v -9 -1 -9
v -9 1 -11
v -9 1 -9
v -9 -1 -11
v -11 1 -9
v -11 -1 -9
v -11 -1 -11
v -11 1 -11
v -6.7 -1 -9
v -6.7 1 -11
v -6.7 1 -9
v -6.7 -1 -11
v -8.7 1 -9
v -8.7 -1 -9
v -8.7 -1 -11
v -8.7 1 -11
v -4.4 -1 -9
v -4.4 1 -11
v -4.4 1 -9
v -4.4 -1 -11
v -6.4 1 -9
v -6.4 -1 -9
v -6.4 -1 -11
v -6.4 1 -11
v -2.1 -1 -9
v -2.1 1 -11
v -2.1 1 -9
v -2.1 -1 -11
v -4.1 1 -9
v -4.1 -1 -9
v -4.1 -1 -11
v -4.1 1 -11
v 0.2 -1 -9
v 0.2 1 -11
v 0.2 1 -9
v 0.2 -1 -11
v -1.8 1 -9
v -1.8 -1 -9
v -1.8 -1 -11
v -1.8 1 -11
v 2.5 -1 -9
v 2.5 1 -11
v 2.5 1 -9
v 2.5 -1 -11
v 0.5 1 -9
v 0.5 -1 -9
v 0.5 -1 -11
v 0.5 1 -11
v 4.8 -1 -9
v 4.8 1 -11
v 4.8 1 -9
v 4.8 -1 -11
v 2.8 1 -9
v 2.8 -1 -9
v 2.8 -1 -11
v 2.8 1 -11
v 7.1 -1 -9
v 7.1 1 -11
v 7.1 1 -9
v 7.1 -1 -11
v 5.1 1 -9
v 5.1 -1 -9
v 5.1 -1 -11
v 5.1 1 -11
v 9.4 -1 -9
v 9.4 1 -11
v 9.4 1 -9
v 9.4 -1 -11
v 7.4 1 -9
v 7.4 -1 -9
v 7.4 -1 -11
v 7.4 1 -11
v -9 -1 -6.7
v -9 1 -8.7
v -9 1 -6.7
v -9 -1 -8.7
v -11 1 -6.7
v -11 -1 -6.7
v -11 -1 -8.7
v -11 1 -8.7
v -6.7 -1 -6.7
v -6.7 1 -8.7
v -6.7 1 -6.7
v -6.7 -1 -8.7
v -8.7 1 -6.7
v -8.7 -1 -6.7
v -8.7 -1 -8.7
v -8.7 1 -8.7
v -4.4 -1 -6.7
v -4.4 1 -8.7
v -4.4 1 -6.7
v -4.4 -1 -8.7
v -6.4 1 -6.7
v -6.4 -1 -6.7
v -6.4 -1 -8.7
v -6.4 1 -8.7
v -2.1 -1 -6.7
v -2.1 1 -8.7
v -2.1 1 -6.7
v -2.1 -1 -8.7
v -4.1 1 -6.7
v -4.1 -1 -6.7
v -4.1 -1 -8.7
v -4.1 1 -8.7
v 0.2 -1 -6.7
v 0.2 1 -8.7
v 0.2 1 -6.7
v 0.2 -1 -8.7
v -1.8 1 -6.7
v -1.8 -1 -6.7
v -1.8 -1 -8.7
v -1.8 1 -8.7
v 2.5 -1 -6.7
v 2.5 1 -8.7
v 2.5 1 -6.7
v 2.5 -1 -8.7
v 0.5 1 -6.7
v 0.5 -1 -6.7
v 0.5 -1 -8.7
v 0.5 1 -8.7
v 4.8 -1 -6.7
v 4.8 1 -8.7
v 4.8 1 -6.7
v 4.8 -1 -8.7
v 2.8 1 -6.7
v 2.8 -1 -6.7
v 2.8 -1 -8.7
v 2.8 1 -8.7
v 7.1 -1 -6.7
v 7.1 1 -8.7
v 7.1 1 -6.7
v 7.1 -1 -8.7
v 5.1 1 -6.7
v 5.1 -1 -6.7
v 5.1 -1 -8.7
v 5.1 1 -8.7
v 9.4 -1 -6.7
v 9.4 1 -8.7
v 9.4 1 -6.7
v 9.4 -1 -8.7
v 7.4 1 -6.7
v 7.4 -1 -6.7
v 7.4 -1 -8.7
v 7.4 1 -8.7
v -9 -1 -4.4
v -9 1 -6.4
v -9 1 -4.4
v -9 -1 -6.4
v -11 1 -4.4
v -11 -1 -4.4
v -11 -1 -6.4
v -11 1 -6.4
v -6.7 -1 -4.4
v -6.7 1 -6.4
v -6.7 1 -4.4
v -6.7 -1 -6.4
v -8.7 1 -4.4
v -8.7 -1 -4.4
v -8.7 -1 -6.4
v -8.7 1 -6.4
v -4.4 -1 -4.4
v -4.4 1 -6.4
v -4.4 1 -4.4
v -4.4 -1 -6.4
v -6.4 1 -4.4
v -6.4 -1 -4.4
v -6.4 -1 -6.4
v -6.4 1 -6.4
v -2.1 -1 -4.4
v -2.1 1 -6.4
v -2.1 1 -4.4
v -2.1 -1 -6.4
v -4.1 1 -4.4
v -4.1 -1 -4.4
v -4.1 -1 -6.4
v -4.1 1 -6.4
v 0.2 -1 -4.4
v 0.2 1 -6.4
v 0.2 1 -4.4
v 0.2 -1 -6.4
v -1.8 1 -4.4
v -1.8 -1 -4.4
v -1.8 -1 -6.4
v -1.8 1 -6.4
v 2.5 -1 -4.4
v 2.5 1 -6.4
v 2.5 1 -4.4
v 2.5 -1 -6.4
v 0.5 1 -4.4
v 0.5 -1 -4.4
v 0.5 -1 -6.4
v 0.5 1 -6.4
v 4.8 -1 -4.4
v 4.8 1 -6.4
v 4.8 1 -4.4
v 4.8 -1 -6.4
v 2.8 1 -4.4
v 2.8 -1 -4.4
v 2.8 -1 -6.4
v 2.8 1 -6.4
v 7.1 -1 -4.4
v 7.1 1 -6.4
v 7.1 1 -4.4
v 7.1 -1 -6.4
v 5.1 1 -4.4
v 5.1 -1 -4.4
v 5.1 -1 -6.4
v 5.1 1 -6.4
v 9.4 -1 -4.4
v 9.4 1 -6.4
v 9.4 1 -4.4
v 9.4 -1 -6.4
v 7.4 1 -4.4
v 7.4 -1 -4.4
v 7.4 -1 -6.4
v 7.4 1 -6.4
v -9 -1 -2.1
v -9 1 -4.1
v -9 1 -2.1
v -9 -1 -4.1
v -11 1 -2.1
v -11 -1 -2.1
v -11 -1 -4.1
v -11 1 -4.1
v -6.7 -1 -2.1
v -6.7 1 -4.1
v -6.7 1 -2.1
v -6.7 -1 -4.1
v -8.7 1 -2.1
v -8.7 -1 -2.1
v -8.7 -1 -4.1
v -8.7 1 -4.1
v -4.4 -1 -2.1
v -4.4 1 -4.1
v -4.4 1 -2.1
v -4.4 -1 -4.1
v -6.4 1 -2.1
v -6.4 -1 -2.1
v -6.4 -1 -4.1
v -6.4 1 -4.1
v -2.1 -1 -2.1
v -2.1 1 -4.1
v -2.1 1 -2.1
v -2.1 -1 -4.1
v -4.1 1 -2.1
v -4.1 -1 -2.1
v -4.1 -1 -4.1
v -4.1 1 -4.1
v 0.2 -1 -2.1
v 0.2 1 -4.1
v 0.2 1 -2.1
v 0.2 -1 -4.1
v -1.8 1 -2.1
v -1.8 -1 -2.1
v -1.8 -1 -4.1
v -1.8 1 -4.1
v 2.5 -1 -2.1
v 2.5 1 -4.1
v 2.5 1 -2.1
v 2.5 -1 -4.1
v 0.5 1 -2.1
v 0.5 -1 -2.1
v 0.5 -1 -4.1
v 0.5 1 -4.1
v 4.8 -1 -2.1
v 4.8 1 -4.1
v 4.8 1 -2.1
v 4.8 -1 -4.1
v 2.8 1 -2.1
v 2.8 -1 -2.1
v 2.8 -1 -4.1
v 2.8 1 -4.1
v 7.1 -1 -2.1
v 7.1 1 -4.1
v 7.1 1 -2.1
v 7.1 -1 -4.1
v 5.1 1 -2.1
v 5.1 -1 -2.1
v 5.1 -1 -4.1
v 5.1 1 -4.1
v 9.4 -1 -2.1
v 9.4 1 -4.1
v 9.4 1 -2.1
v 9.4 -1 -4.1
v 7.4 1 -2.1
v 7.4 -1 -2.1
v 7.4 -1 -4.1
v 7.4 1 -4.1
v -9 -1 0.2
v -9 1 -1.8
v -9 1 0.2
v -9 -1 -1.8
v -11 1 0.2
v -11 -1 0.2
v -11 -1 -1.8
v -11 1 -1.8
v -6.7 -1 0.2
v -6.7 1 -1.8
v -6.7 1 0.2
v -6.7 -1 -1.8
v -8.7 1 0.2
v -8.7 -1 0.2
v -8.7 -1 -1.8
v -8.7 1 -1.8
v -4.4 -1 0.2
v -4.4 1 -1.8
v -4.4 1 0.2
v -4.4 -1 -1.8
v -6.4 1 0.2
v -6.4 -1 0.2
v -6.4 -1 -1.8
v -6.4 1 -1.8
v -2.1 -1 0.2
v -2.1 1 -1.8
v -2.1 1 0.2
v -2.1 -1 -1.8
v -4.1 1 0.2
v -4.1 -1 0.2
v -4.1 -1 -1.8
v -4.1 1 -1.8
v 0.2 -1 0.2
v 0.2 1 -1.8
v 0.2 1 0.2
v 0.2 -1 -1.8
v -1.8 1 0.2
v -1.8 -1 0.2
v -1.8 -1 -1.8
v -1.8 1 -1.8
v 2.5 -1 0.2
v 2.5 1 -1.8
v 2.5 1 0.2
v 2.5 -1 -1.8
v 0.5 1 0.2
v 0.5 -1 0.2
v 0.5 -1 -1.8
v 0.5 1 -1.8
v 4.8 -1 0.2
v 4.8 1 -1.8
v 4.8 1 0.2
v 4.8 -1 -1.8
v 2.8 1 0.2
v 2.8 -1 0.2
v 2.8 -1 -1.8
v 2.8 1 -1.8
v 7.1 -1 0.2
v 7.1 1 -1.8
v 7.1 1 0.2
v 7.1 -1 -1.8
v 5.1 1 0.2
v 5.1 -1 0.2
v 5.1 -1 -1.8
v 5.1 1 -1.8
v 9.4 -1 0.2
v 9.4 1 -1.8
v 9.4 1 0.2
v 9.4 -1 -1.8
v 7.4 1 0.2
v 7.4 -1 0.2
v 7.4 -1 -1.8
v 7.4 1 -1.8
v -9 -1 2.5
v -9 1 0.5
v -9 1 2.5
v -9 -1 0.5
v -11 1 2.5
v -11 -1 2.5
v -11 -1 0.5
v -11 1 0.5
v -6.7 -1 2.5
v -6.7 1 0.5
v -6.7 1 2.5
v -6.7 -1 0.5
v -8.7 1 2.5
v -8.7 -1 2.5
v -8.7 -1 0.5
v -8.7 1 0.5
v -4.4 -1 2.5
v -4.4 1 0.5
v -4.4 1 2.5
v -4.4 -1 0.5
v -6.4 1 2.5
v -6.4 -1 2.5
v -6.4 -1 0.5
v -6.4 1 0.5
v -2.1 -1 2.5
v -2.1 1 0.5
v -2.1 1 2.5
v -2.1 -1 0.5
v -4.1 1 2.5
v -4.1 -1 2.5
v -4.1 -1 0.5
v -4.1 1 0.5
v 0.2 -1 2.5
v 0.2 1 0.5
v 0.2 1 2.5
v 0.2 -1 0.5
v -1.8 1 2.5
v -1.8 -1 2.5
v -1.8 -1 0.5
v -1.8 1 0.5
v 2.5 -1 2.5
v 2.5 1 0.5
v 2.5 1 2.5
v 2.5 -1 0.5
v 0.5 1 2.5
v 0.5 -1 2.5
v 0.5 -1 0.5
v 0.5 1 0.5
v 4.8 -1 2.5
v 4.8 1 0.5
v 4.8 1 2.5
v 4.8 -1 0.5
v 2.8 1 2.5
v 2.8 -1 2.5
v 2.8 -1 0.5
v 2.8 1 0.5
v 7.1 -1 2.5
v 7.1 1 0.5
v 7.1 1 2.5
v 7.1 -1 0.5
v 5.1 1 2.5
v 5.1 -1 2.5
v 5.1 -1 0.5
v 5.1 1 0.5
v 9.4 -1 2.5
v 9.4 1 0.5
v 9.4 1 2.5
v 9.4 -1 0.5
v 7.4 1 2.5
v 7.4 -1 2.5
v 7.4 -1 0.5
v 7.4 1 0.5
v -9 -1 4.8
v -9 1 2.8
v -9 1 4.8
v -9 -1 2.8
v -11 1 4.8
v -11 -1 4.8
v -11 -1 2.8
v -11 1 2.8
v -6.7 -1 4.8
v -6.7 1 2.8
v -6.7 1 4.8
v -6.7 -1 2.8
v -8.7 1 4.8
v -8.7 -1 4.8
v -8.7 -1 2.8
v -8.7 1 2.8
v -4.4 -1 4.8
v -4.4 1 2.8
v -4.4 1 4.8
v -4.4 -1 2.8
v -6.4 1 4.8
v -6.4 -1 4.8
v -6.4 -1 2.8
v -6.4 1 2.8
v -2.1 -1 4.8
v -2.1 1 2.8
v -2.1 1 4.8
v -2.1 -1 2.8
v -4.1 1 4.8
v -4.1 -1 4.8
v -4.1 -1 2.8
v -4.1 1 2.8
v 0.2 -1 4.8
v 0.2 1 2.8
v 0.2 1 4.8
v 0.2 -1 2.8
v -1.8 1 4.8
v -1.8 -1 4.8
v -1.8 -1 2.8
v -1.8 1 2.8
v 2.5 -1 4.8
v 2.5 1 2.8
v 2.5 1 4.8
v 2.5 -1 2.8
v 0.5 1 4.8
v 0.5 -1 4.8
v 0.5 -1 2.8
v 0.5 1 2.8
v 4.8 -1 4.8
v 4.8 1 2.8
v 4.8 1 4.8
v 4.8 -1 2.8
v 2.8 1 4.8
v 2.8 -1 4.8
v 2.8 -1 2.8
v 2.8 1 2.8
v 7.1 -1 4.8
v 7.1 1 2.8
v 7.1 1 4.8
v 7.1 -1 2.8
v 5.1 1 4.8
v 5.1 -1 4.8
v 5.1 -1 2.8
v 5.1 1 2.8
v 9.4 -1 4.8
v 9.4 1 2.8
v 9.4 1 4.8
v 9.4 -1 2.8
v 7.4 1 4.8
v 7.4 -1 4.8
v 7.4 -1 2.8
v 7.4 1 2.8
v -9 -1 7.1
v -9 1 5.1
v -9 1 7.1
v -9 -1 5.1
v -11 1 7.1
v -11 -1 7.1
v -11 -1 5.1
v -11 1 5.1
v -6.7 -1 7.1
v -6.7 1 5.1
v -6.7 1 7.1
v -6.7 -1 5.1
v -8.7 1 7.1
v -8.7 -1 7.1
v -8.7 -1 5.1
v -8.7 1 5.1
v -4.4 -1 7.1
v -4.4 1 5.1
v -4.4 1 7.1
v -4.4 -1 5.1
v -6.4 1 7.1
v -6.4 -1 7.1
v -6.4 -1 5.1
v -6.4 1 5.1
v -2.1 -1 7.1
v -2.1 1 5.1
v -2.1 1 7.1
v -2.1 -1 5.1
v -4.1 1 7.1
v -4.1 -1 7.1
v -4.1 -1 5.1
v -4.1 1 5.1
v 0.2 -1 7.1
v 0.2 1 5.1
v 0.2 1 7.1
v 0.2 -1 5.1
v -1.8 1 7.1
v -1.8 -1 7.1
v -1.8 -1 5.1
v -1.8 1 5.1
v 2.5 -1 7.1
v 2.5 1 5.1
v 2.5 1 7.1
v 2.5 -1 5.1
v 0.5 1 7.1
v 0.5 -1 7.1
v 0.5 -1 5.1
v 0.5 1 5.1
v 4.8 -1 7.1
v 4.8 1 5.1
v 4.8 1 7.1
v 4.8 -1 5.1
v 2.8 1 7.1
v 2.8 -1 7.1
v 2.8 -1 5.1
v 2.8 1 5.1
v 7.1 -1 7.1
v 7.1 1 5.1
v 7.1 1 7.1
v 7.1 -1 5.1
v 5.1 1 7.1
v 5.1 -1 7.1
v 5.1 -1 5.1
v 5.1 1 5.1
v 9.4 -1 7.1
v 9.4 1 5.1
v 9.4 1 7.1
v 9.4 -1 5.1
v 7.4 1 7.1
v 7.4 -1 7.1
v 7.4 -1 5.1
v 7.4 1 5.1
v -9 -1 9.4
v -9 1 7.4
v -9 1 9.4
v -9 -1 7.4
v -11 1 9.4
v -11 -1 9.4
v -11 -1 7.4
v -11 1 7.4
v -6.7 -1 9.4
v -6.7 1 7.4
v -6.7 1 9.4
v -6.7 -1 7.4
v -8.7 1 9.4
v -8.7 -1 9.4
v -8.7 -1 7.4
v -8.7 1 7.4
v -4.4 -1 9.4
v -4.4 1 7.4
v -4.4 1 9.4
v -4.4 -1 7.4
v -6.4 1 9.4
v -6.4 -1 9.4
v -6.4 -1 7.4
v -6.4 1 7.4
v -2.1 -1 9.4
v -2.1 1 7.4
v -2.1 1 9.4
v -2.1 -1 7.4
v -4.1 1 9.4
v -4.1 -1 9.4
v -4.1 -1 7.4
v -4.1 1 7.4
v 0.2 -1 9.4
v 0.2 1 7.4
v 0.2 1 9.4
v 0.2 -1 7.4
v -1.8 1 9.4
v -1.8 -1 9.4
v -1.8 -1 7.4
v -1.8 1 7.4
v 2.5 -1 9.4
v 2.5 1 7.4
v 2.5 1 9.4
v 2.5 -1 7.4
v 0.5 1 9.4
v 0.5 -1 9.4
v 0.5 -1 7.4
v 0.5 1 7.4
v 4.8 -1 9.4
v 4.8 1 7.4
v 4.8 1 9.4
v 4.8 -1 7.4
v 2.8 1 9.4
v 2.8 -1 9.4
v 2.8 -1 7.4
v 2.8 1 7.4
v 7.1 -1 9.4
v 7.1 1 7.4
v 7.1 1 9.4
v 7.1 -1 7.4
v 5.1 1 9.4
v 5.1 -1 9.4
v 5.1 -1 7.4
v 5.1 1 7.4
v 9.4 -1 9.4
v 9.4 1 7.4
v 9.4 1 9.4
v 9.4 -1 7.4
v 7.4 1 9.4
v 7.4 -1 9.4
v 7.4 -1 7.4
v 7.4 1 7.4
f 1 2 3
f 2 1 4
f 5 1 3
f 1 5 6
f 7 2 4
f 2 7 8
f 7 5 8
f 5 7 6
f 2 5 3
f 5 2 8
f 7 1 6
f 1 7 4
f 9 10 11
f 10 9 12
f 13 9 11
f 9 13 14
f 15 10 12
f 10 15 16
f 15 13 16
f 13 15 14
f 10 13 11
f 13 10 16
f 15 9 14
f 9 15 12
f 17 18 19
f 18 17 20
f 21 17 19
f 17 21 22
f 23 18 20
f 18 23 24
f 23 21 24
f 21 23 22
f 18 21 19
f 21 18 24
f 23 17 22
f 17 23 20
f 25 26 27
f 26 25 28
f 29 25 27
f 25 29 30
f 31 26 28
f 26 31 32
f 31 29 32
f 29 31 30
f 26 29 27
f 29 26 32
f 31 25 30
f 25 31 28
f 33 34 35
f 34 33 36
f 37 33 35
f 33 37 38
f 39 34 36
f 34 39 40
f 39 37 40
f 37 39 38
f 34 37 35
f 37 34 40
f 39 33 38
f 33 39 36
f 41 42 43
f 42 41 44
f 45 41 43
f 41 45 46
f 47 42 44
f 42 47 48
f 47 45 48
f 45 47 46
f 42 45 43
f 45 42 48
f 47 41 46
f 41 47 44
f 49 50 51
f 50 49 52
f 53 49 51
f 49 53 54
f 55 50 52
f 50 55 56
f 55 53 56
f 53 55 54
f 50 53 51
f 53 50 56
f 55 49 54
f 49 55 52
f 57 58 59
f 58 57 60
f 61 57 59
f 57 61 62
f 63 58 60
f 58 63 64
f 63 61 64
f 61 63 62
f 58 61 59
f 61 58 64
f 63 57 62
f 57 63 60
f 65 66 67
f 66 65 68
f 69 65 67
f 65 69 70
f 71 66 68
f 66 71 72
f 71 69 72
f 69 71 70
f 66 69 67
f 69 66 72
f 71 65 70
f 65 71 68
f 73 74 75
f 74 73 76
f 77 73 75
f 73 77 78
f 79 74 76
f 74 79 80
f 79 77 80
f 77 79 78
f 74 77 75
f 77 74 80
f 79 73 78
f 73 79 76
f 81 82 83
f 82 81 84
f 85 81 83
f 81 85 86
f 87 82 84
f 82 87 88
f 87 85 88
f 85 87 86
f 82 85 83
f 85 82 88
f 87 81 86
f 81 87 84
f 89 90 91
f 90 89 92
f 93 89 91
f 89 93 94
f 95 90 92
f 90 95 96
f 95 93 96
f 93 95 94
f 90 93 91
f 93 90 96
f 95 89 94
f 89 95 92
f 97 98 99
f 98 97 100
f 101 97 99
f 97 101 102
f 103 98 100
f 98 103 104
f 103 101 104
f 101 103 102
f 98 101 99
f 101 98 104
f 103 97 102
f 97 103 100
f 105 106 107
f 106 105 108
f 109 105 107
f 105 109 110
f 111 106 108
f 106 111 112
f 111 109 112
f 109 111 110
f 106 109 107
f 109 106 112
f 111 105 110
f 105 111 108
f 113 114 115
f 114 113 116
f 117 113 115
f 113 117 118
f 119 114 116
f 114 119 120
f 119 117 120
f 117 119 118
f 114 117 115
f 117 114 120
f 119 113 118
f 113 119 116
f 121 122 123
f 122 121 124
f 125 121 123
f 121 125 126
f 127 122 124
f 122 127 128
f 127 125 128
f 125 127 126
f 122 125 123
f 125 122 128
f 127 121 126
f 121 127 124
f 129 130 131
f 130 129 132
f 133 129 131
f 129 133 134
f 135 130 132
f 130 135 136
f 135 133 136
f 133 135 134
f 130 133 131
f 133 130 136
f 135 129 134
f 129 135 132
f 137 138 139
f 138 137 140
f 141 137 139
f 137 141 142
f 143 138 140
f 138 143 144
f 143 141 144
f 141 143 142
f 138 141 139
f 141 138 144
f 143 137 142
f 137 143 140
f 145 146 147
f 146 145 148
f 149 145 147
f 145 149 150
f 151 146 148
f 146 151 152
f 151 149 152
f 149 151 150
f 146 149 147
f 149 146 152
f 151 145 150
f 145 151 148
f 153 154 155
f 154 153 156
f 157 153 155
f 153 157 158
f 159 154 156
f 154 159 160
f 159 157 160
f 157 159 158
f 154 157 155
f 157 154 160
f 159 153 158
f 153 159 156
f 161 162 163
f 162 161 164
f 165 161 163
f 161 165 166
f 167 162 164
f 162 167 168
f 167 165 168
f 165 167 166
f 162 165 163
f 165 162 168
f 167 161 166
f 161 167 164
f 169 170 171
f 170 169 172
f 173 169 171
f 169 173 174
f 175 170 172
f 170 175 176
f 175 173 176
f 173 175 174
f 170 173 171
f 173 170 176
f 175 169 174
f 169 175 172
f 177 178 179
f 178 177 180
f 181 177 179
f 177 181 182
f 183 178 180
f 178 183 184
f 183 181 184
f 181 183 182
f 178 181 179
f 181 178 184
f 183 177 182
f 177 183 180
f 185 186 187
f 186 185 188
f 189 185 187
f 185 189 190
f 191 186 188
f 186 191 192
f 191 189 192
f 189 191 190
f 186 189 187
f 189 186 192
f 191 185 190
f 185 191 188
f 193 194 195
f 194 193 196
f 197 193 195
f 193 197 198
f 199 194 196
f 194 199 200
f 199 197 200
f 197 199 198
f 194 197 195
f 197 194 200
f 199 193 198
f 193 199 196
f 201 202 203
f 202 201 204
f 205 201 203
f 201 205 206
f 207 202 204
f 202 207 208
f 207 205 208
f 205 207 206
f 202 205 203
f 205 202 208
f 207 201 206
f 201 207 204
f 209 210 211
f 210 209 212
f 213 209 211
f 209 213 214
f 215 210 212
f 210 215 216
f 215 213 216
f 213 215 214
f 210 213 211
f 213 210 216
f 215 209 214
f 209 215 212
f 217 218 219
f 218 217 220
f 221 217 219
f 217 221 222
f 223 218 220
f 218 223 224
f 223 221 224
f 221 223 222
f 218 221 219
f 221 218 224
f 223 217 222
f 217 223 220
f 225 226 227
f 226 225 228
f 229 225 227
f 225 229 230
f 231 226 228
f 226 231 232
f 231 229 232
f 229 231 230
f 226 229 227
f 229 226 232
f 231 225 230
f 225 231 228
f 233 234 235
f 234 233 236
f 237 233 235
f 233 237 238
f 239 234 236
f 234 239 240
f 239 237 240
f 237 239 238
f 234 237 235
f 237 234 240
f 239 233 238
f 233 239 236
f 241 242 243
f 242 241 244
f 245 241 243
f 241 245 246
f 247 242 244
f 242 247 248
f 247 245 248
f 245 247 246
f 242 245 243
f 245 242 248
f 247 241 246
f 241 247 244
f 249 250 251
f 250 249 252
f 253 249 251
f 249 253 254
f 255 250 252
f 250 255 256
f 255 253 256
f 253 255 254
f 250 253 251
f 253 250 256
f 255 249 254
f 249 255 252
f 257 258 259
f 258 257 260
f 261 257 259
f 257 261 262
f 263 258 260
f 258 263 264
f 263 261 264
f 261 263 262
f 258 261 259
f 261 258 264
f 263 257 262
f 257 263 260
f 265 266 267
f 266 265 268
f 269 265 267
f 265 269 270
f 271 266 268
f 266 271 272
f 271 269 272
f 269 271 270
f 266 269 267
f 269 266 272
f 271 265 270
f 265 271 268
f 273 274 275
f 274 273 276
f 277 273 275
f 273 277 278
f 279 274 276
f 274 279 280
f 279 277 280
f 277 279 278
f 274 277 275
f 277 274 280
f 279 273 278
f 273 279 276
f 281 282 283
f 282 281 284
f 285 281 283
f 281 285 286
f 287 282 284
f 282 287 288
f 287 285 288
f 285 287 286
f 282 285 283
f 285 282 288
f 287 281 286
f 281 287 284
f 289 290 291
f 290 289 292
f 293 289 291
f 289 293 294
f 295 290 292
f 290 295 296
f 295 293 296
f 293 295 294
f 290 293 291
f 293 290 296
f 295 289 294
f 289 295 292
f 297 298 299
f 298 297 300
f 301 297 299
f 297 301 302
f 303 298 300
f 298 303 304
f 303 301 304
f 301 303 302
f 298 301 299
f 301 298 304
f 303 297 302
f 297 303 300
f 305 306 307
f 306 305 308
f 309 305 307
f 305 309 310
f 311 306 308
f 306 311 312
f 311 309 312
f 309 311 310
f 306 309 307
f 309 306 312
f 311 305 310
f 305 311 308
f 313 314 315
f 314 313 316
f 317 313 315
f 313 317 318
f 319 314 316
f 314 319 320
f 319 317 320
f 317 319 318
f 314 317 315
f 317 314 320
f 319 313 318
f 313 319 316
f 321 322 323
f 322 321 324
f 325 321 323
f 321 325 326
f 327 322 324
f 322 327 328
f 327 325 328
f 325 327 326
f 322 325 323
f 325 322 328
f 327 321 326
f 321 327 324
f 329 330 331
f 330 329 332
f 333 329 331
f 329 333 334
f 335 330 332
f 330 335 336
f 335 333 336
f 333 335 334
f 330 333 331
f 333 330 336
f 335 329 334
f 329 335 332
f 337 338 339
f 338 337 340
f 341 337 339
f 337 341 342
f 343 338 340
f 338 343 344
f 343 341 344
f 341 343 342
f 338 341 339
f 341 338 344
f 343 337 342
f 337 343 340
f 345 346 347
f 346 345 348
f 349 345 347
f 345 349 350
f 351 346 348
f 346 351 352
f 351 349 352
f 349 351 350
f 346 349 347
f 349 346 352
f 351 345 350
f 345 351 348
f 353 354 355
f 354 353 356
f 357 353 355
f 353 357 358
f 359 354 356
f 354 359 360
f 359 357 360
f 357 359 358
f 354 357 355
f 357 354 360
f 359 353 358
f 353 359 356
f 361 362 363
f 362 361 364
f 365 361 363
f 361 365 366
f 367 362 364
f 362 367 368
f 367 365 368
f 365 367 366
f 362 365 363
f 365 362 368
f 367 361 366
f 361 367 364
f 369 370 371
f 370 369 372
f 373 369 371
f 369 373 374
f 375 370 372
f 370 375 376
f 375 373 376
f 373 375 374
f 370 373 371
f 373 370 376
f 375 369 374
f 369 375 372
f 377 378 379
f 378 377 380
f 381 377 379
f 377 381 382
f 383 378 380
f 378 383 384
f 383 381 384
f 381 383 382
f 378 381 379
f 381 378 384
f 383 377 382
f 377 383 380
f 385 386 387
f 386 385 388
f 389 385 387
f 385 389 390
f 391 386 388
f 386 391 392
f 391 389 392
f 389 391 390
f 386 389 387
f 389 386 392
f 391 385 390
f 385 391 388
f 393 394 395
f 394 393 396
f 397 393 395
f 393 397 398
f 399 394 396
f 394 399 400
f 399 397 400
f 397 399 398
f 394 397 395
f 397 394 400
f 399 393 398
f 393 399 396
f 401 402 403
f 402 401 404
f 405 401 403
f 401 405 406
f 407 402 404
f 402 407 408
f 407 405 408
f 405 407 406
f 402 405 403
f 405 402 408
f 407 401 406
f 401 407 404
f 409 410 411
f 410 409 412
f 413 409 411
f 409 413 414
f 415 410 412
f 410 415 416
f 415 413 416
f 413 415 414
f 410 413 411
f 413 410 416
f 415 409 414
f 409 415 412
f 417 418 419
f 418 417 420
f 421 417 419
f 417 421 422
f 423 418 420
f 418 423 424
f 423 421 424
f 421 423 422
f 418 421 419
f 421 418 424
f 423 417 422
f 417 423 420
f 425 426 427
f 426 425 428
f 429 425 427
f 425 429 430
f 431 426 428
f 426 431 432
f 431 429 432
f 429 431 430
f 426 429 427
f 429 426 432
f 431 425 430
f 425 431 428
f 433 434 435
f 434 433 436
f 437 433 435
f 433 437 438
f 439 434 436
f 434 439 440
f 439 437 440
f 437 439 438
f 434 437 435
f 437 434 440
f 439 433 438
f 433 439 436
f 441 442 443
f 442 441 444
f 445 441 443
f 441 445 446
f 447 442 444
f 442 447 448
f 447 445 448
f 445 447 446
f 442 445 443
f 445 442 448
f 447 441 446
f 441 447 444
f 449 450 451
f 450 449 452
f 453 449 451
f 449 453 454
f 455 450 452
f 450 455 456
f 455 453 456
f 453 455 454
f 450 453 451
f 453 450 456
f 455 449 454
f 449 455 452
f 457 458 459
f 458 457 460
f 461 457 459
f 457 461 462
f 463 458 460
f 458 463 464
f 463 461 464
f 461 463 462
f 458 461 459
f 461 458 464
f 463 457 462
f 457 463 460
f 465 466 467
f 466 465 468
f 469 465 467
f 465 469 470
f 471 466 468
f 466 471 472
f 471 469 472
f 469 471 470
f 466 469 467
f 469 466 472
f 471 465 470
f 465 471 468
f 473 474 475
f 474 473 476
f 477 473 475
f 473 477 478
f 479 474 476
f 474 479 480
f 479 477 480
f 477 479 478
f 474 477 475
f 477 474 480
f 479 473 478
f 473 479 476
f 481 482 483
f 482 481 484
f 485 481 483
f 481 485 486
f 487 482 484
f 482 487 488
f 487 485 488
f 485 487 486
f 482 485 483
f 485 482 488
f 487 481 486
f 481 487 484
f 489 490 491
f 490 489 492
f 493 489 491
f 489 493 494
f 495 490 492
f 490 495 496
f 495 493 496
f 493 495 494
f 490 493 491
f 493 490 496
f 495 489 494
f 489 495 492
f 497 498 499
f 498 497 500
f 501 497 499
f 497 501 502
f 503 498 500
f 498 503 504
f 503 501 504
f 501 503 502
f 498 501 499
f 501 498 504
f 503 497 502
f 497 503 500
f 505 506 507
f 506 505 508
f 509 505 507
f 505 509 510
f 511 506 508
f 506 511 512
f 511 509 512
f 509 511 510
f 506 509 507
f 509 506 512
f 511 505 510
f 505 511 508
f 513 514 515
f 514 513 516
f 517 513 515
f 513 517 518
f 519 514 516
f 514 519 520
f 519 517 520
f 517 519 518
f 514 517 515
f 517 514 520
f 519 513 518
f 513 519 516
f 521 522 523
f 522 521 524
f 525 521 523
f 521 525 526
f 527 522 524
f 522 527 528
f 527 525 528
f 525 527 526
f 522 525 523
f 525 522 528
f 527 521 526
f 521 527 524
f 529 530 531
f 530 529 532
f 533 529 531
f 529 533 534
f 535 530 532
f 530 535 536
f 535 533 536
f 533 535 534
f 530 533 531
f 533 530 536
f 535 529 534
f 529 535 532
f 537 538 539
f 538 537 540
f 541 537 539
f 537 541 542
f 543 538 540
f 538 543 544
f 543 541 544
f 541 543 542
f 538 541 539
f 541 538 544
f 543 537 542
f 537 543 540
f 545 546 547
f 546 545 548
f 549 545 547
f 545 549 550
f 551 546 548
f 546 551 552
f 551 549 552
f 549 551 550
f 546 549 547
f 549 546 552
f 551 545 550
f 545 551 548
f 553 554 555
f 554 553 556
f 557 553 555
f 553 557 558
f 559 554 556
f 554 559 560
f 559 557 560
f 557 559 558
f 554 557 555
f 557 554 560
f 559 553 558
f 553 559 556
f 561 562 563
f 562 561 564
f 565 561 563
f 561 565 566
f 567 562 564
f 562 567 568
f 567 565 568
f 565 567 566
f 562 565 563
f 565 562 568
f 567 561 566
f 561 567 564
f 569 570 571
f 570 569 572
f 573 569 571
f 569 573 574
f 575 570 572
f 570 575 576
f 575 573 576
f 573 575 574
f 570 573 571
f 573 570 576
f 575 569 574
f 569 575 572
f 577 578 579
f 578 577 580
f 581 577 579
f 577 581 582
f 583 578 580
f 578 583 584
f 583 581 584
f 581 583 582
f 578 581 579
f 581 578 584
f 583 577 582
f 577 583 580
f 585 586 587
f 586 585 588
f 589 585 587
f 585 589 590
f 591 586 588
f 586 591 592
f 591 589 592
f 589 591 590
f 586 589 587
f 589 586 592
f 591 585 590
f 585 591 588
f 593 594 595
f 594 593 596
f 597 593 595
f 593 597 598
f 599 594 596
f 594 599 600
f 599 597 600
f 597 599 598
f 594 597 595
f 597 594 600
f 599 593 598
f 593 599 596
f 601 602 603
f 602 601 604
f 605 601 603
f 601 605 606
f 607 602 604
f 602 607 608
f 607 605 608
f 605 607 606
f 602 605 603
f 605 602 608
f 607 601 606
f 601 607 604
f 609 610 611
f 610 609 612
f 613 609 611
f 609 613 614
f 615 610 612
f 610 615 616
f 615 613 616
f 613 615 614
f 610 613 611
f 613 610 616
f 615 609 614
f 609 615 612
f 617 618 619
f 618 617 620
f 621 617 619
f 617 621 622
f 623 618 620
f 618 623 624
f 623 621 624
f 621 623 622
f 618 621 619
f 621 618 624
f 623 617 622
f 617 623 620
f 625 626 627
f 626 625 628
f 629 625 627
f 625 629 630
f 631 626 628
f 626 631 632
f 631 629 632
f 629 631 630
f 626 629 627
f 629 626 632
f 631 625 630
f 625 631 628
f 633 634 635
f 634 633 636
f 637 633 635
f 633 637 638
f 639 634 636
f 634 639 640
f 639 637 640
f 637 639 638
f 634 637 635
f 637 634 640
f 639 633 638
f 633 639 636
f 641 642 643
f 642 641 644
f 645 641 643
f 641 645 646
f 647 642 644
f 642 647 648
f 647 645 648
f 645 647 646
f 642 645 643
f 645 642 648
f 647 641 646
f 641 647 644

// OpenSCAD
cube_sheet();

module cube_sheet() {
    
color("Beige",0.2)
for (j = [-10:2.3:10]) {
 for (i = [-10:2.3:10]) {
 translate([i,0,j])
 cube(2,center=true);   
} 
}
}
